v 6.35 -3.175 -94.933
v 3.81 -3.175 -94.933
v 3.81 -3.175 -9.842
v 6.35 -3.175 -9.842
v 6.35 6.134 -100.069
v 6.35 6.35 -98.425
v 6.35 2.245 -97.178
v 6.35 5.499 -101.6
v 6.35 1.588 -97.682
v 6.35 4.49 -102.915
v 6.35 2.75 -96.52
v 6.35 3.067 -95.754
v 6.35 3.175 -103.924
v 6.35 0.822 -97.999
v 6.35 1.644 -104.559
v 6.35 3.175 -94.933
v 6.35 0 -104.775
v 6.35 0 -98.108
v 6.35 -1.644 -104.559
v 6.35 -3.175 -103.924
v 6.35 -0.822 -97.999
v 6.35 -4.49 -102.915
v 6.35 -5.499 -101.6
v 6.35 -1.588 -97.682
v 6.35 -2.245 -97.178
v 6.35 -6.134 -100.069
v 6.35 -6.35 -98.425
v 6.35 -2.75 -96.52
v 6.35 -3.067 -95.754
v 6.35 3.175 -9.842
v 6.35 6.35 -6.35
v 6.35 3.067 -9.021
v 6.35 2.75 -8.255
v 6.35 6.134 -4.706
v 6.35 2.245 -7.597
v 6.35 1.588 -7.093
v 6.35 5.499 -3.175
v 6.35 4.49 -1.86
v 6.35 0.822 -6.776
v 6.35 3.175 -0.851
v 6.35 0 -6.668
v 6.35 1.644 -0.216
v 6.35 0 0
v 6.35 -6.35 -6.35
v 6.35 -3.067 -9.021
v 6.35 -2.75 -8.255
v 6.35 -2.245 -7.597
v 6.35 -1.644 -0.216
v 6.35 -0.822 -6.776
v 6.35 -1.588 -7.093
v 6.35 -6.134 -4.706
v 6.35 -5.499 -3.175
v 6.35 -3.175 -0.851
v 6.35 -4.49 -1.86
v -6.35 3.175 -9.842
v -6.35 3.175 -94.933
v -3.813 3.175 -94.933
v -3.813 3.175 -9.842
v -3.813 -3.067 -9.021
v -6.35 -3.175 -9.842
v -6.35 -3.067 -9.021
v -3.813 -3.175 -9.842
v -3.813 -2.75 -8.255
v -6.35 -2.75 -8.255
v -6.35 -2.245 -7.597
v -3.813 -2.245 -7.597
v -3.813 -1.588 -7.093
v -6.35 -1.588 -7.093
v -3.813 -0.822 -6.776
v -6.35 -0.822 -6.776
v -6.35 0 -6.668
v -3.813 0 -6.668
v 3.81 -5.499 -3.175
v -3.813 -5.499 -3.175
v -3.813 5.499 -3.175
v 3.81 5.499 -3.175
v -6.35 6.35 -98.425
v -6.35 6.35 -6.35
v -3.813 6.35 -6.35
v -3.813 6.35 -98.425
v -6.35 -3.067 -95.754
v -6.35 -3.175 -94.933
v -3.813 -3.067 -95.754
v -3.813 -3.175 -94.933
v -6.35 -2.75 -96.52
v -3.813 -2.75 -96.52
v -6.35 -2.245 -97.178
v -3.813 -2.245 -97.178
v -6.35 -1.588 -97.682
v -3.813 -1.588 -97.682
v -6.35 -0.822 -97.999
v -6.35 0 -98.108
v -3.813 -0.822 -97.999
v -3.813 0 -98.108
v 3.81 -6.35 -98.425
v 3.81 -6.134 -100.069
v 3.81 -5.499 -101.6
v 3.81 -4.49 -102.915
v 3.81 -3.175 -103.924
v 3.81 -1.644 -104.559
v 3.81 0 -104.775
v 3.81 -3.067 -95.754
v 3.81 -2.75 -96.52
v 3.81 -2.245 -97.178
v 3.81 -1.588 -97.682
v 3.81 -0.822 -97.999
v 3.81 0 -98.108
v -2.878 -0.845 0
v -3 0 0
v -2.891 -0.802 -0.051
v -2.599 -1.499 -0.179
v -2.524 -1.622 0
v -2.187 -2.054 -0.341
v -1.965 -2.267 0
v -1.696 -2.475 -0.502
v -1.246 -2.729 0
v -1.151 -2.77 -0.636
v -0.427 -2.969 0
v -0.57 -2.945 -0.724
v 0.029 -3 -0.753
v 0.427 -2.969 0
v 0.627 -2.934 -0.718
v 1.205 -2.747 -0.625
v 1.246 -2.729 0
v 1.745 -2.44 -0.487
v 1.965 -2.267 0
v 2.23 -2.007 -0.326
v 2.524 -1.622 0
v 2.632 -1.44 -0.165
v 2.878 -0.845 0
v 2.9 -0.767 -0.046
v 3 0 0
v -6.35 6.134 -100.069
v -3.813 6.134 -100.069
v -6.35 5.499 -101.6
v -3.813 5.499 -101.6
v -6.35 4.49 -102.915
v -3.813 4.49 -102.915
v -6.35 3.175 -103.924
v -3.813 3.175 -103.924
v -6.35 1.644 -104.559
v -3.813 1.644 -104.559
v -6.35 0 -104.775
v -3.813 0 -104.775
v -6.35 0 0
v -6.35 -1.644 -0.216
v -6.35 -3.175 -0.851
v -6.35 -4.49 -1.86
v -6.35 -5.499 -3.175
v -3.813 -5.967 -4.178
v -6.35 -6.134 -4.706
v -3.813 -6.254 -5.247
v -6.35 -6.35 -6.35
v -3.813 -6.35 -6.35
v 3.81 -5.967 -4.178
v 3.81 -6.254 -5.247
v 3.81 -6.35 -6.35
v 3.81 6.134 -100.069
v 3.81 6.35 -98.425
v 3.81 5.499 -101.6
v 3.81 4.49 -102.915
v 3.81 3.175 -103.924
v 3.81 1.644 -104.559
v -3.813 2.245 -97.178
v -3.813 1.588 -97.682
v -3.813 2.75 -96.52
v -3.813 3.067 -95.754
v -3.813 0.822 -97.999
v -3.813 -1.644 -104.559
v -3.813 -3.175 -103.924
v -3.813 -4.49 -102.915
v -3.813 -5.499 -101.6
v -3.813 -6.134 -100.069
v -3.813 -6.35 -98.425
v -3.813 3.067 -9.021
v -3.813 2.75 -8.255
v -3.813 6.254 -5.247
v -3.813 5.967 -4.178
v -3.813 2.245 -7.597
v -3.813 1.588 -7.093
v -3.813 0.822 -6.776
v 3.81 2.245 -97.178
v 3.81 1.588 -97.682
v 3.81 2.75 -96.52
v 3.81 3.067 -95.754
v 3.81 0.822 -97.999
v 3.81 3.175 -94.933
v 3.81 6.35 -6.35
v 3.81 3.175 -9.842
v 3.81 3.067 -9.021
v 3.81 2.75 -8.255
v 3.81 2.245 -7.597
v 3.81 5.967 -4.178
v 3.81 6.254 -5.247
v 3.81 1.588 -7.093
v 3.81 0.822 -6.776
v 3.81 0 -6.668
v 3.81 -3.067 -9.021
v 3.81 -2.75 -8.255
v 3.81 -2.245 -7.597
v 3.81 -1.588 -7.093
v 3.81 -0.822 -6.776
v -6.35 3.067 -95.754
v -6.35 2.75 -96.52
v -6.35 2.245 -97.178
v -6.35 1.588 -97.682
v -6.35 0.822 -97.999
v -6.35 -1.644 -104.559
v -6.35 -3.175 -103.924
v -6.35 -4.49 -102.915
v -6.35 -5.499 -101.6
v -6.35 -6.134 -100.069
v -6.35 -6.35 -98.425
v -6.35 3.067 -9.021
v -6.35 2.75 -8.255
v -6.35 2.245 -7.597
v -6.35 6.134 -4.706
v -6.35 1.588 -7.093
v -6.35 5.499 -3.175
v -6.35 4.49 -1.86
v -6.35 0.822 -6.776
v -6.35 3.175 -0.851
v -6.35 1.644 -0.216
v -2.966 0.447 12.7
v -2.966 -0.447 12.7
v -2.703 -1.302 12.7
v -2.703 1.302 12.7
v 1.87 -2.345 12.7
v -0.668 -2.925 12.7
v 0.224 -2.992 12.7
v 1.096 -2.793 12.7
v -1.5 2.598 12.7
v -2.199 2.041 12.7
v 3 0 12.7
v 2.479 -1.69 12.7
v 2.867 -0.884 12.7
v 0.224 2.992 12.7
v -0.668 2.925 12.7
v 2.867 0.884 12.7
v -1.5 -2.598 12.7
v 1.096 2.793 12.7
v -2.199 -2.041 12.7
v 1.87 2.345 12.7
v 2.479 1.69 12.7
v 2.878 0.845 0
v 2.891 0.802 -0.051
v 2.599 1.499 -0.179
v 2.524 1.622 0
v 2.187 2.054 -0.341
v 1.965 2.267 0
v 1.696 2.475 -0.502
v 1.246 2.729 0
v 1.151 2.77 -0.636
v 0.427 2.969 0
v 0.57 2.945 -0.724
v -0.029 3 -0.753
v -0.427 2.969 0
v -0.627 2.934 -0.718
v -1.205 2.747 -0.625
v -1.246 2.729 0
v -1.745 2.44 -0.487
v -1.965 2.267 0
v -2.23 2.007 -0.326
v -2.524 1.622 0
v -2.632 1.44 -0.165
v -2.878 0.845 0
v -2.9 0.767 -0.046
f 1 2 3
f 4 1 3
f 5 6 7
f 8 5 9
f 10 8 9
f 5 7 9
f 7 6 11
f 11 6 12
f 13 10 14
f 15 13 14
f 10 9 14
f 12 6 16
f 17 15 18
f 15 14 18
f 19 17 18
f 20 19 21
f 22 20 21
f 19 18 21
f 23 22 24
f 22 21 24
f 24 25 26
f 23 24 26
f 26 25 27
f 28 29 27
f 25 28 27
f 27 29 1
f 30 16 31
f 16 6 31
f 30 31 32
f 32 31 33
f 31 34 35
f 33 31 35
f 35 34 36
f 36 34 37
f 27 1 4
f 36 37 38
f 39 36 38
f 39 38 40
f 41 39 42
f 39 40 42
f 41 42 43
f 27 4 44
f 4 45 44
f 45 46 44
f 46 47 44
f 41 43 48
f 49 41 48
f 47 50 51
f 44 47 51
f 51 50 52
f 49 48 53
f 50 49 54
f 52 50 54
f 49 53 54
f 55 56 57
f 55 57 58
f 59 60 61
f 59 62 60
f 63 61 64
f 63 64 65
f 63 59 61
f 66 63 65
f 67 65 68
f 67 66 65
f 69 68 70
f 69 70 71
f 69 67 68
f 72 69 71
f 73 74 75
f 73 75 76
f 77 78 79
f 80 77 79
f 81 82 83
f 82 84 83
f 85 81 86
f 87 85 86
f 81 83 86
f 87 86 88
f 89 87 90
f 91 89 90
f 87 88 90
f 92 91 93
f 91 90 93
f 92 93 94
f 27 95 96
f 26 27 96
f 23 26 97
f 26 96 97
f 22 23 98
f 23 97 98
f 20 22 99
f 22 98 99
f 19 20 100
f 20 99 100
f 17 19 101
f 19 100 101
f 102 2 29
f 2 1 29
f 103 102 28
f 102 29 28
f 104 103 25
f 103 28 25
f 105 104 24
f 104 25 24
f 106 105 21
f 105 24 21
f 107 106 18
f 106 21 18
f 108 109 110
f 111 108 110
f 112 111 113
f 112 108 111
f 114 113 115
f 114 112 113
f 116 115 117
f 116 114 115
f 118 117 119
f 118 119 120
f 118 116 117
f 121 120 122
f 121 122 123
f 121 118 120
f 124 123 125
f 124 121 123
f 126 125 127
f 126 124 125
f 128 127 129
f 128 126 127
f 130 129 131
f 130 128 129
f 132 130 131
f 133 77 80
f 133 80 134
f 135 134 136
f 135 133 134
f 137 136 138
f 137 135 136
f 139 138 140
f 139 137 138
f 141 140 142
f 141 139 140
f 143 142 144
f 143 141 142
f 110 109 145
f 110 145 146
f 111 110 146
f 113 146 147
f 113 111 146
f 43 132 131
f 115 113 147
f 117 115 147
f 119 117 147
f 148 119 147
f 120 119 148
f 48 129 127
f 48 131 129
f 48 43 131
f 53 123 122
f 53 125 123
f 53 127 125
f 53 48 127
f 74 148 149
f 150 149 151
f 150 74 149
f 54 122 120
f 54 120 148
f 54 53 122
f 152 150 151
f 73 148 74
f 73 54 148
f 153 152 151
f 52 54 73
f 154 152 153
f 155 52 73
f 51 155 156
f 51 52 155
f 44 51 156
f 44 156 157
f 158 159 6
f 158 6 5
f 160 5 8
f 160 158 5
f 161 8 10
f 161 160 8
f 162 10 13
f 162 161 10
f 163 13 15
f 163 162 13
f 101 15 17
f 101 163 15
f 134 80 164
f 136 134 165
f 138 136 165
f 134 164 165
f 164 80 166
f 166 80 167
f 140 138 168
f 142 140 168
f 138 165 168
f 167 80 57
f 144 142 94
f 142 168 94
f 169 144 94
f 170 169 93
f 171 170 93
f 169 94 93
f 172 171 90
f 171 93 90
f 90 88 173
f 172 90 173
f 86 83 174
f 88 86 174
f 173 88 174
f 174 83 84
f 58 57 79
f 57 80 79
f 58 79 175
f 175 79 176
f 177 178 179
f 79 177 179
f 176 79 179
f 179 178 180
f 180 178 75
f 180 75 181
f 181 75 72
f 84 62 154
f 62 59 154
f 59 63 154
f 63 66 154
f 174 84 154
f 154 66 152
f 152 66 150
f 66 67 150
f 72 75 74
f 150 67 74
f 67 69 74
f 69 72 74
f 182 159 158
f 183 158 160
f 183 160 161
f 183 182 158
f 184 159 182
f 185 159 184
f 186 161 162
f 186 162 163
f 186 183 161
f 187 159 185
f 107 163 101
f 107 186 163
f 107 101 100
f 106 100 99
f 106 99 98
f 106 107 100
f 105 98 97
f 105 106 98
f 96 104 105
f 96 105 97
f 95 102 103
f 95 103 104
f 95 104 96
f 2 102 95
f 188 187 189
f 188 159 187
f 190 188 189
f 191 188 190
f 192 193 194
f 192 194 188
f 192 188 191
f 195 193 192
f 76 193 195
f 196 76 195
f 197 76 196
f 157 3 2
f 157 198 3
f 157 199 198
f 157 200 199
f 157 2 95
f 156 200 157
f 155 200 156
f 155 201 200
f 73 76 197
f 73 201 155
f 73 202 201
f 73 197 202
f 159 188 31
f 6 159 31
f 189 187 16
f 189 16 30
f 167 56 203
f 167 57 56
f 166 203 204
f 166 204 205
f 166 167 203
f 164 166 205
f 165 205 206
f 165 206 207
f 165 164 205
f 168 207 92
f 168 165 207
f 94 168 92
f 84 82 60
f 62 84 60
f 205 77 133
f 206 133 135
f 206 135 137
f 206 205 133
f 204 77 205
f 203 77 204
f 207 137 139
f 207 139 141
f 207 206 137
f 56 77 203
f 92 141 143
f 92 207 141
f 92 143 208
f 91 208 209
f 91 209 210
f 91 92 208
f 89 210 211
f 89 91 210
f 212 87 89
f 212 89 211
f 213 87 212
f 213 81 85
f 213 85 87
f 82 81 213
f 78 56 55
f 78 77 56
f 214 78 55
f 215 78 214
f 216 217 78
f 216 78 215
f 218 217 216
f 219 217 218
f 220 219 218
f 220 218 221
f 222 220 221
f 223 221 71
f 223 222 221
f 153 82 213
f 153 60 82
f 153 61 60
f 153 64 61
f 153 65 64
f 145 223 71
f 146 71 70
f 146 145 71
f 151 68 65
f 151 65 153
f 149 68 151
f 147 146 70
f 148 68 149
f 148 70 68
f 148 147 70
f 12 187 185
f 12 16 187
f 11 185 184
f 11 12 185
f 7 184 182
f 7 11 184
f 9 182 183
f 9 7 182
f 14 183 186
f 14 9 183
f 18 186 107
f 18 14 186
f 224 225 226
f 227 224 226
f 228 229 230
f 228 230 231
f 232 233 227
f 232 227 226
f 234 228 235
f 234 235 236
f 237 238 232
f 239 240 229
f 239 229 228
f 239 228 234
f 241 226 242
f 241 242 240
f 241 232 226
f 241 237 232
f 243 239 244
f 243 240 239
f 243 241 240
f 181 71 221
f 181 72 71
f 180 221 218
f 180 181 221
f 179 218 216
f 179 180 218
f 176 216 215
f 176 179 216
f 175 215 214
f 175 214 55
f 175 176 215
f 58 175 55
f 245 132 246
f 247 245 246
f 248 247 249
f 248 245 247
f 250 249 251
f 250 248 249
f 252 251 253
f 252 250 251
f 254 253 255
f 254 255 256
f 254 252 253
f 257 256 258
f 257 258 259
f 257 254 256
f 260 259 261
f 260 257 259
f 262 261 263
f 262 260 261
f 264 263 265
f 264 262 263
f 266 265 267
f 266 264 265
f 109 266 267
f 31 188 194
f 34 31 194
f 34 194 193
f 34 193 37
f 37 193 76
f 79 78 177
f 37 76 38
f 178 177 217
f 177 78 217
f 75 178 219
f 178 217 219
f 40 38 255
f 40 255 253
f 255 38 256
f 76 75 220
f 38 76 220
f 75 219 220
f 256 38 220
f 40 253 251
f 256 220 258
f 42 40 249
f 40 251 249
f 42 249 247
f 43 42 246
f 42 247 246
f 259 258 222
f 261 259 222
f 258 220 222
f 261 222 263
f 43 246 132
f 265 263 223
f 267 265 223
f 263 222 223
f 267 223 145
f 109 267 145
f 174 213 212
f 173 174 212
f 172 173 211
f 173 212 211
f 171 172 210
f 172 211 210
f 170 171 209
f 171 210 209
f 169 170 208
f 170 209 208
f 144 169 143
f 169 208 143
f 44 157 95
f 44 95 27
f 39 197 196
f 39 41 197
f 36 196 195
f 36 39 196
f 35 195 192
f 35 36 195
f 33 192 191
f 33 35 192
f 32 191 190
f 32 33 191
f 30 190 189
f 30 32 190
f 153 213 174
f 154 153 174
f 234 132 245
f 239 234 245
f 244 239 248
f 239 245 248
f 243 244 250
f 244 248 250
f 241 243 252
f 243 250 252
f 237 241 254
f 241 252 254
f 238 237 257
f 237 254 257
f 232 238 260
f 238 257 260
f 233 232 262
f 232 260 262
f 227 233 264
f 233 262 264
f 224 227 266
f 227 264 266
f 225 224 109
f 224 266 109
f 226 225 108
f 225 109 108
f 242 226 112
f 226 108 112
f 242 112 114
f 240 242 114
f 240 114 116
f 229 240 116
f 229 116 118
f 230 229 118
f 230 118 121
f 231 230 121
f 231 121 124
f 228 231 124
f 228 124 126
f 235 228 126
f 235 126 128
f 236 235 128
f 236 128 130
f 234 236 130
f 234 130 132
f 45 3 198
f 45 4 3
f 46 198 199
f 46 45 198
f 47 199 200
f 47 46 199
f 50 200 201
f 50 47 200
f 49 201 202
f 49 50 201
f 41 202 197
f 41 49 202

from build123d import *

# Parameters (mm, degrees)
F0_R         = 3
F1_DEPTH     = 12.7
F2_W         = 12.7
F2_H         = 12.7
F3_DEPTH     = 3.175
F4_W         = 2.5373954162
F4_H         = 12.7
F4_W_2       = 2.54
F5_DEPTH     = 101.6
F6_T1_DEPTH  = 34.2873954162
F6_T3_DEPTH  = 34.29
F6_T8_DEPTH  = 44.45
F6_S9_R      = 3
F6_T10_DEPTH = 24
F6_T14_DEPTH = 44.45
F6_S15_R     = 3
F6_T16_DEPTH = 24
F7_W         = 3.175
F7_H         = 91.44
F8_DEPTH     = 25.4
F9_R         = 3.17499


# Not quite as in the source:
# - a fillet or chamfer that OpenCascade refuses, or shapes differently, is made with other operations: its cross-section is extruded or revolved along the edge and cut away or added
# - a fillet or chamfer is up to 0.001 mm smaller than in the source, because OpenCascade refuses the exact size


with BuildPart() as f1:
    # F0 (on Top) → F1 (new body)
    with BuildSketch(Plane.XY):
        Circle(F0_R)
    extrude(amount=F1_DEPTH)

    # F2 (on face) → F3 (join)
    with BuildSketch(Plane(origin=(0, 0, 0), x_dir=(1, 0, 0), z_dir=(0, 0, -1))):
        Rectangle(F2_W, F2_H)
    extrude(amount=F3_DEPTH)

    # F4 (on face) → F5 (join)
    with BuildSketch(Plane(origin=(0, 0, -3.175), x_dir=(1, 0, 0), z_dir=(0, 0, -1))):
        with Locations((-5.0813022919, 0)):
            Rectangle(F4_W, F4_H)
        with Locations((5.08, 0)):
            Rectangle(F4_W_2, F4_H)
    extrude(amount=F5_DEPTH)

    # F6: fillet of radius 6.35 on 6 edges, made by hand

    # F6_s2 → F6_t1 (cut)
    with BuildSketch(Plane.YZ.offset(-22.225)):
        with BuildLine():
            ThreePointArc((-6.35, -98.425), (-4.4901280605, -102.9151280605), (0, -104.775))
            Line((0, -104.775), (-6.35, -104.775))
            Line((-6.35, -104.775), (-6.35, -98.425))
        make_face()
        with BuildLine():
            ThreePointArc((6.35, -98.425), (4.4901280605, -102.9151280605), (0, -104.775))
            Line((0, -104.775), (6.35, -104.775))
            Line((6.35, -104.775), (6.35, -98.425))
        make_face()
    extrude(amount=F6_T1_DEPTH, mode=Mode.SUBTRACT)

    # F6_s4 → F6_t3 (cut)
    with BuildSketch(Plane.YZ.offset(-12.065)):
        with BuildLine():
            ThreePointArc((6.35, -98.425), (4.4901280605, -102.9151280605), (0, -104.775))
            Line((0, -104.775), (6.35, -104.775))
            Line((6.35, -104.775), (6.35, -98.425))
        make_face()
        with BuildLine():
            ThreePointArc((-6.35, -98.425), (-4.4901280605, -102.9151280605), (0, -104.775))
            Line((0, -104.775), (-6.35, -104.775))
            Line((-6.35, -104.775), (-6.35, -98.425))
        make_face()
    extrude(amount=F6_T3_DEPTH, mode=Mode.SUBTRACT)


with BuildPart() as f6_tool6:
    # F6_s7 → F6_t8 (new body)
    with BuildSketch(Plane.YZ.offset(-22.225)):
        with BuildLine():
            ThreePointArc((6.35, -6.35), (4.4901280605, -1.8598719395), (0, 0))
            Line((0, 0), (6.35, 0))
            Line((6.35, 0), (6.35, -6.35))
        make_face()
    extrude(amount=F6_T8_DEPTH)

    # F6_s9 → F6_t10 (cut, symmetric)
    with BuildSketch(Plane.XY.offset(-3.2)):
        Circle(F6_S9_R)
    extrude(amount=F6_T10_DEPTH, both=True, mode=Mode.SUBTRACT)


with BuildPart() as f1_1:
    add(f1.part)

    # F6_t5: cut F6_tool6
    add(f6_tool6.part, mode=Mode.SUBTRACT)


with BuildPart() as f6_tool12:
    # F6_s13 → F6_t14 (new body)
    with BuildSketch(Plane.YZ.offset(22.225)):
        with BuildLine():
            ThreePointArc((0, 0), (-4.4901280605, -1.8598719395), (-6.35, -6.35))
            Line((-6.35, -6.35), (-6.35, 0))
            Line((-6.35, 0), (0, 0))
        make_face()
    extrude(amount=-F6_T14_DEPTH)

    # F6_s15 → F6_t16 (cut, symmetric)
    with BuildSketch(Plane.XY.offset(-3.2)):
        Circle(F6_S15_R)
    extrude(amount=F6_T16_DEPTH, both=True, mode=Mode.SUBTRACT)


with BuildPart() as f1_2:
    add(f1_1.part)

    # F6_t11: cut F6_tool12
    add(f6_tool12.part, mode=Mode.SUBTRACT)

    # F7 (on face) → F8 (cut)
    with BuildSketch(Plane(origin=(-6.35, 0, 0), x_dir=(0, -1, 0), z_dir=(-1, 0, 0))):
        with Locations((1.5875, -52.3875)):
            Rectangle(F7_W, F7_H)
        with Locations((-1.5875, -52.3875)):
            Rectangle(F7_W, F7_H)
    extrude(amount=-F8_DEPTH, mode=Mode.SUBTRACT)

    # F9 (radius 3.175 in the source; OpenCascade refuses exactly that, so slightly less here)
    f9_edges = [f1_2.edges().sort_by_distance(p)[0] for p in [
        (-5.081302, -3.175, -98.1075),
        (-5.081302, -3.175, -6.6675),
        (-5.081302, 3.175, -6.6675),
        (5.08, 3.175, -6.6675),
        (5.08, -3.175, -6.6675),
        (-5.081302, 3.175, -98.1075),
        (5.08, 3.175, -98.1075),
        (5.08, -3.175, -98.1075),
    ]]
    fillet(f9_edges, radius=F9_R)


solid = f1_2.part
